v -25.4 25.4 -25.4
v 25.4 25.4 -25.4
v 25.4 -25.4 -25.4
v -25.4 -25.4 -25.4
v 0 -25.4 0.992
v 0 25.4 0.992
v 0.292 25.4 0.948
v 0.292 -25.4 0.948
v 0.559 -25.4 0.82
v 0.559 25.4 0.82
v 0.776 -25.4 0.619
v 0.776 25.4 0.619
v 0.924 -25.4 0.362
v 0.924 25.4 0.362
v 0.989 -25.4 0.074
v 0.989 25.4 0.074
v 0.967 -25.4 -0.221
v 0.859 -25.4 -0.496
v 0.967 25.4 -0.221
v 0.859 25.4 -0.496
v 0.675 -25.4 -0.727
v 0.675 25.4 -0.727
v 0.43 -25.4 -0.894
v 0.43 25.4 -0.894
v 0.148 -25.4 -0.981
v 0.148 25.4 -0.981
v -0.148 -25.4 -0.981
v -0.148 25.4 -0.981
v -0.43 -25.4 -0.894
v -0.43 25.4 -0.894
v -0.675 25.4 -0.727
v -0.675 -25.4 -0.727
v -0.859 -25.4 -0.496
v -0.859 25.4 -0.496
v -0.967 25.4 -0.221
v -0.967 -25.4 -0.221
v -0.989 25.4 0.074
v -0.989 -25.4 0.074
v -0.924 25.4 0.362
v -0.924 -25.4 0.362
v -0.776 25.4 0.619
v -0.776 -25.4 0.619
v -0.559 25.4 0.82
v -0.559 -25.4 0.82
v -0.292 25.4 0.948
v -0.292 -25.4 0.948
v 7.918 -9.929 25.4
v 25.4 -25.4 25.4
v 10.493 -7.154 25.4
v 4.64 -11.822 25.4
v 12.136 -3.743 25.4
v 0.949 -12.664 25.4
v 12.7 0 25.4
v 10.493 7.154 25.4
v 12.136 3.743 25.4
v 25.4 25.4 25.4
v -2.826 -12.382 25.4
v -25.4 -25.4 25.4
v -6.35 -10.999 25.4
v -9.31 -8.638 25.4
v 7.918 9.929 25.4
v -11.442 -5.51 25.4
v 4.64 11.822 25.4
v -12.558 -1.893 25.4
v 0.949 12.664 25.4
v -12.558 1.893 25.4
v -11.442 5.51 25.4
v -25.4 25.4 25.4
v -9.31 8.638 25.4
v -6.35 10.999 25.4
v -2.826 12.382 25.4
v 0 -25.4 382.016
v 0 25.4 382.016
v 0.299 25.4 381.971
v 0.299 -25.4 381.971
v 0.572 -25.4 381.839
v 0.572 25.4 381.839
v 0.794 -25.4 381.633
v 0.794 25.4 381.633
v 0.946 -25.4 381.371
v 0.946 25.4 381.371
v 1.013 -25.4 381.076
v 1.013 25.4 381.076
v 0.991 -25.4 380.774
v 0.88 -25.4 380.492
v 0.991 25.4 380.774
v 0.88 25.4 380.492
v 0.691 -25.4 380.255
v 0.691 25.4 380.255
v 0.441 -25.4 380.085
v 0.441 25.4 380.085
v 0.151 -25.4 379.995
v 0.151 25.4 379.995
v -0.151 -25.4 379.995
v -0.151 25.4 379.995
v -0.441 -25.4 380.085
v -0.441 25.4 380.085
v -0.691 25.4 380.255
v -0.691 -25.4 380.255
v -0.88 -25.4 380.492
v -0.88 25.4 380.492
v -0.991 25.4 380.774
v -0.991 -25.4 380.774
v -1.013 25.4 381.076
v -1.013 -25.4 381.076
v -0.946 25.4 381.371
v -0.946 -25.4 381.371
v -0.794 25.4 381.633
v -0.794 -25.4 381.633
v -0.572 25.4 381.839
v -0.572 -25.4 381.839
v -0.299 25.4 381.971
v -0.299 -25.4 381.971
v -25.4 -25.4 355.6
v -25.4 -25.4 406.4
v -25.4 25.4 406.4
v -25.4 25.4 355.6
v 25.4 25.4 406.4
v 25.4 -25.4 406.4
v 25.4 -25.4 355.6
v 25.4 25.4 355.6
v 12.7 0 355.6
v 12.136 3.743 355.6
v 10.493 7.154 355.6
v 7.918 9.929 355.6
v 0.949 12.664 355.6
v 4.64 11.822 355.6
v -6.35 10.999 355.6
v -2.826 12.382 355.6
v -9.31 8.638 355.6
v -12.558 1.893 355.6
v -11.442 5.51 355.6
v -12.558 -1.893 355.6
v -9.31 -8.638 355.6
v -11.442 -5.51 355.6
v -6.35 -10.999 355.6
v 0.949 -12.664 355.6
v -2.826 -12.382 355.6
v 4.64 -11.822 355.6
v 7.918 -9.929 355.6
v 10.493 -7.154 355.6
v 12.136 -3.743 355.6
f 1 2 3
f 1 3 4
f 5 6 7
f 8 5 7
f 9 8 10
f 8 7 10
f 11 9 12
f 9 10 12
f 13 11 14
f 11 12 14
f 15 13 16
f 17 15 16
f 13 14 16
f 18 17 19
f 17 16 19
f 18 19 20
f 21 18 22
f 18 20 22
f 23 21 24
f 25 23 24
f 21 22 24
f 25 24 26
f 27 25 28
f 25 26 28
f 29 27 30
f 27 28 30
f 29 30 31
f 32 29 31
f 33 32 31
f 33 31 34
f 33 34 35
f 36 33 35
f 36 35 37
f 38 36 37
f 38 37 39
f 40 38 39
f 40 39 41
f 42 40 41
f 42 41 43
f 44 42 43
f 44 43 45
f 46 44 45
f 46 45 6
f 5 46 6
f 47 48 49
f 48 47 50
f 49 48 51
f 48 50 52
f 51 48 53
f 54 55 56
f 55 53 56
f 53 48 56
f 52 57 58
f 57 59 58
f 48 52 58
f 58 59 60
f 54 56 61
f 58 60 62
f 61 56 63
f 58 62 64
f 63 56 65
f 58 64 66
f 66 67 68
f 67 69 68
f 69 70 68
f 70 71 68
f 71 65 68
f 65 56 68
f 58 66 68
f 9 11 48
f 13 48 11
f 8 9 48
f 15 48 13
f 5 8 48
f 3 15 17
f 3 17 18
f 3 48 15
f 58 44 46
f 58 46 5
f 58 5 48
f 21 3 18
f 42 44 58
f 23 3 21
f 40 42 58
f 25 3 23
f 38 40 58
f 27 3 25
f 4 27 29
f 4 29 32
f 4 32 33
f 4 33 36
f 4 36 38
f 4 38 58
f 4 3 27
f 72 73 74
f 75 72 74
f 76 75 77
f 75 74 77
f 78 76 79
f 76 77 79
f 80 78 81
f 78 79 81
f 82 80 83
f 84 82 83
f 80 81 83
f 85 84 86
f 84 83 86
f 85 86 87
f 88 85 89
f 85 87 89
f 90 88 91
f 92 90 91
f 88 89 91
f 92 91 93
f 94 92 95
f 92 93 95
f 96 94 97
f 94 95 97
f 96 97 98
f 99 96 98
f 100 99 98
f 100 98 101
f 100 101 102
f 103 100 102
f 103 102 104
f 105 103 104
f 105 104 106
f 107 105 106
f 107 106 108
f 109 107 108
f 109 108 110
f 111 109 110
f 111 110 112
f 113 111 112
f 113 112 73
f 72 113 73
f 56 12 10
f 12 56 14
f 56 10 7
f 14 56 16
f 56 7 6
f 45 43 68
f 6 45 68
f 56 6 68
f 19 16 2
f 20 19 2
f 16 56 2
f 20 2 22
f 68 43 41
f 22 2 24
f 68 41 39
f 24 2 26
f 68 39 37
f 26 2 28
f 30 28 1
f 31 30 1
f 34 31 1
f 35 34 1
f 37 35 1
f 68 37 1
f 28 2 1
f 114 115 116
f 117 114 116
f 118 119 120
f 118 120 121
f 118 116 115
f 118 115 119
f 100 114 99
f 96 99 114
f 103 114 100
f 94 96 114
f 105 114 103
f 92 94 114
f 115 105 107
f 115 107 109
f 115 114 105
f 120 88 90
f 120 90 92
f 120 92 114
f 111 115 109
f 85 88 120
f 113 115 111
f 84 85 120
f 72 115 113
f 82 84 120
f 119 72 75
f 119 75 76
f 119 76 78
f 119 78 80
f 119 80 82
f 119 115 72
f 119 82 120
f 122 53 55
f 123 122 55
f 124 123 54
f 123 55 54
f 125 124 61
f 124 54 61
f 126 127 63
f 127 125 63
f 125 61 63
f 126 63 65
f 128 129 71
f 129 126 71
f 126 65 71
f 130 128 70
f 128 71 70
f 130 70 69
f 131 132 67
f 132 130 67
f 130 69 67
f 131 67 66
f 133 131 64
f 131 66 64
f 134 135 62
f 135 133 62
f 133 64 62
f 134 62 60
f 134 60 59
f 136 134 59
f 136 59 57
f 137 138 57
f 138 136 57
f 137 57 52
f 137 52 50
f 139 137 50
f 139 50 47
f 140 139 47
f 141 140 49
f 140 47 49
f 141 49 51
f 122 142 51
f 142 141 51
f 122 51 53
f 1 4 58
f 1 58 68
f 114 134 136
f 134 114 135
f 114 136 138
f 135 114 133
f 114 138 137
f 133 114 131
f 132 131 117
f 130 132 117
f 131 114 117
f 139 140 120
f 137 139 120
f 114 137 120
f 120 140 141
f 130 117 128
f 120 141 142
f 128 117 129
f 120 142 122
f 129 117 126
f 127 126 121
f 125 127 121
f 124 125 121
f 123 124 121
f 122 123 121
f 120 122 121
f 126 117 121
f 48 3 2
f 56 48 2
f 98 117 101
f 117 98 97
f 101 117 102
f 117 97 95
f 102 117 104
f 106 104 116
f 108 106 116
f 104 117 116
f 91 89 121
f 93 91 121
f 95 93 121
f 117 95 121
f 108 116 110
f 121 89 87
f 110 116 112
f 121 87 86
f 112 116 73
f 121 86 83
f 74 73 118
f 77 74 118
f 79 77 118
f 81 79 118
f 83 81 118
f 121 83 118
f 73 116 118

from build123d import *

# Parameters (mm, degrees)
SKETCH3_R           = 12.7
BOSS_EXTRUDE1_DEPTH = 381
SKETCH4_W           = 50.8
SKETCH4_H           = 50.8
BOSS_EXTRUDE2_DEPTH = 25.4
SKETCH5_W           = 50.8
SKETCH5_H           = 50.8
BOSS_EXTRUDE3_DEPTH = 25.4
SKETCH6_R           = 1.016
SKETCH6_R_2         = 0.9921875
CUT_EXTRUDE1_DEPTH  = 411.349558304


with BuildPart() as part:
    # Sketch3 → Boss-Extrude1 (new body)
    with BuildSketch(Plane.XY):
        Circle(SKETCH3_R)
    extrude(amount=BOSS_EXTRUDE1_DEPTH)

    # Sketch4 → Boss-Extrude2 (add, symmetric)
    with BuildSketch(Plane(origin=(0, 0, 0), x_dir=(-1, 0, 0), z_dir=(0, 0, -1))):
        Rectangle(SKETCH4_W, SKETCH4_H)
    extrude(amount=BOSS_EXTRUDE2_DEPTH, both=True)

    # Sketch5 → Boss-Extrude3 (add, symmetric)
    with BuildSketch(Plane.XY.offset(381)):
        Rectangle(SKETCH5_W, SKETCH5_H)
    extrude(amount=BOSS_EXTRUDE3_DEPTH, both=True)

    # Sketch6 → Cut-Extrude1 (cut, through all)
    with BuildSketch(Plane(origin=(0, 25.4, 0), x_dir=(1, 0, 0), z_dir=(0, 1, 0))):
        with Locations(Location((0, -381, 0), (0, 0, 270))):
            Circle(SKETCH6_R)
        with Locations(Location((0, 0, 0), (0, 0, 270))):
            Circle(SKETCH6_R_2)
    extrude(amount=-CUT_EXTRUDE1_DEPTH, mode=Mode.SUBTRACT)


solid = part.part
